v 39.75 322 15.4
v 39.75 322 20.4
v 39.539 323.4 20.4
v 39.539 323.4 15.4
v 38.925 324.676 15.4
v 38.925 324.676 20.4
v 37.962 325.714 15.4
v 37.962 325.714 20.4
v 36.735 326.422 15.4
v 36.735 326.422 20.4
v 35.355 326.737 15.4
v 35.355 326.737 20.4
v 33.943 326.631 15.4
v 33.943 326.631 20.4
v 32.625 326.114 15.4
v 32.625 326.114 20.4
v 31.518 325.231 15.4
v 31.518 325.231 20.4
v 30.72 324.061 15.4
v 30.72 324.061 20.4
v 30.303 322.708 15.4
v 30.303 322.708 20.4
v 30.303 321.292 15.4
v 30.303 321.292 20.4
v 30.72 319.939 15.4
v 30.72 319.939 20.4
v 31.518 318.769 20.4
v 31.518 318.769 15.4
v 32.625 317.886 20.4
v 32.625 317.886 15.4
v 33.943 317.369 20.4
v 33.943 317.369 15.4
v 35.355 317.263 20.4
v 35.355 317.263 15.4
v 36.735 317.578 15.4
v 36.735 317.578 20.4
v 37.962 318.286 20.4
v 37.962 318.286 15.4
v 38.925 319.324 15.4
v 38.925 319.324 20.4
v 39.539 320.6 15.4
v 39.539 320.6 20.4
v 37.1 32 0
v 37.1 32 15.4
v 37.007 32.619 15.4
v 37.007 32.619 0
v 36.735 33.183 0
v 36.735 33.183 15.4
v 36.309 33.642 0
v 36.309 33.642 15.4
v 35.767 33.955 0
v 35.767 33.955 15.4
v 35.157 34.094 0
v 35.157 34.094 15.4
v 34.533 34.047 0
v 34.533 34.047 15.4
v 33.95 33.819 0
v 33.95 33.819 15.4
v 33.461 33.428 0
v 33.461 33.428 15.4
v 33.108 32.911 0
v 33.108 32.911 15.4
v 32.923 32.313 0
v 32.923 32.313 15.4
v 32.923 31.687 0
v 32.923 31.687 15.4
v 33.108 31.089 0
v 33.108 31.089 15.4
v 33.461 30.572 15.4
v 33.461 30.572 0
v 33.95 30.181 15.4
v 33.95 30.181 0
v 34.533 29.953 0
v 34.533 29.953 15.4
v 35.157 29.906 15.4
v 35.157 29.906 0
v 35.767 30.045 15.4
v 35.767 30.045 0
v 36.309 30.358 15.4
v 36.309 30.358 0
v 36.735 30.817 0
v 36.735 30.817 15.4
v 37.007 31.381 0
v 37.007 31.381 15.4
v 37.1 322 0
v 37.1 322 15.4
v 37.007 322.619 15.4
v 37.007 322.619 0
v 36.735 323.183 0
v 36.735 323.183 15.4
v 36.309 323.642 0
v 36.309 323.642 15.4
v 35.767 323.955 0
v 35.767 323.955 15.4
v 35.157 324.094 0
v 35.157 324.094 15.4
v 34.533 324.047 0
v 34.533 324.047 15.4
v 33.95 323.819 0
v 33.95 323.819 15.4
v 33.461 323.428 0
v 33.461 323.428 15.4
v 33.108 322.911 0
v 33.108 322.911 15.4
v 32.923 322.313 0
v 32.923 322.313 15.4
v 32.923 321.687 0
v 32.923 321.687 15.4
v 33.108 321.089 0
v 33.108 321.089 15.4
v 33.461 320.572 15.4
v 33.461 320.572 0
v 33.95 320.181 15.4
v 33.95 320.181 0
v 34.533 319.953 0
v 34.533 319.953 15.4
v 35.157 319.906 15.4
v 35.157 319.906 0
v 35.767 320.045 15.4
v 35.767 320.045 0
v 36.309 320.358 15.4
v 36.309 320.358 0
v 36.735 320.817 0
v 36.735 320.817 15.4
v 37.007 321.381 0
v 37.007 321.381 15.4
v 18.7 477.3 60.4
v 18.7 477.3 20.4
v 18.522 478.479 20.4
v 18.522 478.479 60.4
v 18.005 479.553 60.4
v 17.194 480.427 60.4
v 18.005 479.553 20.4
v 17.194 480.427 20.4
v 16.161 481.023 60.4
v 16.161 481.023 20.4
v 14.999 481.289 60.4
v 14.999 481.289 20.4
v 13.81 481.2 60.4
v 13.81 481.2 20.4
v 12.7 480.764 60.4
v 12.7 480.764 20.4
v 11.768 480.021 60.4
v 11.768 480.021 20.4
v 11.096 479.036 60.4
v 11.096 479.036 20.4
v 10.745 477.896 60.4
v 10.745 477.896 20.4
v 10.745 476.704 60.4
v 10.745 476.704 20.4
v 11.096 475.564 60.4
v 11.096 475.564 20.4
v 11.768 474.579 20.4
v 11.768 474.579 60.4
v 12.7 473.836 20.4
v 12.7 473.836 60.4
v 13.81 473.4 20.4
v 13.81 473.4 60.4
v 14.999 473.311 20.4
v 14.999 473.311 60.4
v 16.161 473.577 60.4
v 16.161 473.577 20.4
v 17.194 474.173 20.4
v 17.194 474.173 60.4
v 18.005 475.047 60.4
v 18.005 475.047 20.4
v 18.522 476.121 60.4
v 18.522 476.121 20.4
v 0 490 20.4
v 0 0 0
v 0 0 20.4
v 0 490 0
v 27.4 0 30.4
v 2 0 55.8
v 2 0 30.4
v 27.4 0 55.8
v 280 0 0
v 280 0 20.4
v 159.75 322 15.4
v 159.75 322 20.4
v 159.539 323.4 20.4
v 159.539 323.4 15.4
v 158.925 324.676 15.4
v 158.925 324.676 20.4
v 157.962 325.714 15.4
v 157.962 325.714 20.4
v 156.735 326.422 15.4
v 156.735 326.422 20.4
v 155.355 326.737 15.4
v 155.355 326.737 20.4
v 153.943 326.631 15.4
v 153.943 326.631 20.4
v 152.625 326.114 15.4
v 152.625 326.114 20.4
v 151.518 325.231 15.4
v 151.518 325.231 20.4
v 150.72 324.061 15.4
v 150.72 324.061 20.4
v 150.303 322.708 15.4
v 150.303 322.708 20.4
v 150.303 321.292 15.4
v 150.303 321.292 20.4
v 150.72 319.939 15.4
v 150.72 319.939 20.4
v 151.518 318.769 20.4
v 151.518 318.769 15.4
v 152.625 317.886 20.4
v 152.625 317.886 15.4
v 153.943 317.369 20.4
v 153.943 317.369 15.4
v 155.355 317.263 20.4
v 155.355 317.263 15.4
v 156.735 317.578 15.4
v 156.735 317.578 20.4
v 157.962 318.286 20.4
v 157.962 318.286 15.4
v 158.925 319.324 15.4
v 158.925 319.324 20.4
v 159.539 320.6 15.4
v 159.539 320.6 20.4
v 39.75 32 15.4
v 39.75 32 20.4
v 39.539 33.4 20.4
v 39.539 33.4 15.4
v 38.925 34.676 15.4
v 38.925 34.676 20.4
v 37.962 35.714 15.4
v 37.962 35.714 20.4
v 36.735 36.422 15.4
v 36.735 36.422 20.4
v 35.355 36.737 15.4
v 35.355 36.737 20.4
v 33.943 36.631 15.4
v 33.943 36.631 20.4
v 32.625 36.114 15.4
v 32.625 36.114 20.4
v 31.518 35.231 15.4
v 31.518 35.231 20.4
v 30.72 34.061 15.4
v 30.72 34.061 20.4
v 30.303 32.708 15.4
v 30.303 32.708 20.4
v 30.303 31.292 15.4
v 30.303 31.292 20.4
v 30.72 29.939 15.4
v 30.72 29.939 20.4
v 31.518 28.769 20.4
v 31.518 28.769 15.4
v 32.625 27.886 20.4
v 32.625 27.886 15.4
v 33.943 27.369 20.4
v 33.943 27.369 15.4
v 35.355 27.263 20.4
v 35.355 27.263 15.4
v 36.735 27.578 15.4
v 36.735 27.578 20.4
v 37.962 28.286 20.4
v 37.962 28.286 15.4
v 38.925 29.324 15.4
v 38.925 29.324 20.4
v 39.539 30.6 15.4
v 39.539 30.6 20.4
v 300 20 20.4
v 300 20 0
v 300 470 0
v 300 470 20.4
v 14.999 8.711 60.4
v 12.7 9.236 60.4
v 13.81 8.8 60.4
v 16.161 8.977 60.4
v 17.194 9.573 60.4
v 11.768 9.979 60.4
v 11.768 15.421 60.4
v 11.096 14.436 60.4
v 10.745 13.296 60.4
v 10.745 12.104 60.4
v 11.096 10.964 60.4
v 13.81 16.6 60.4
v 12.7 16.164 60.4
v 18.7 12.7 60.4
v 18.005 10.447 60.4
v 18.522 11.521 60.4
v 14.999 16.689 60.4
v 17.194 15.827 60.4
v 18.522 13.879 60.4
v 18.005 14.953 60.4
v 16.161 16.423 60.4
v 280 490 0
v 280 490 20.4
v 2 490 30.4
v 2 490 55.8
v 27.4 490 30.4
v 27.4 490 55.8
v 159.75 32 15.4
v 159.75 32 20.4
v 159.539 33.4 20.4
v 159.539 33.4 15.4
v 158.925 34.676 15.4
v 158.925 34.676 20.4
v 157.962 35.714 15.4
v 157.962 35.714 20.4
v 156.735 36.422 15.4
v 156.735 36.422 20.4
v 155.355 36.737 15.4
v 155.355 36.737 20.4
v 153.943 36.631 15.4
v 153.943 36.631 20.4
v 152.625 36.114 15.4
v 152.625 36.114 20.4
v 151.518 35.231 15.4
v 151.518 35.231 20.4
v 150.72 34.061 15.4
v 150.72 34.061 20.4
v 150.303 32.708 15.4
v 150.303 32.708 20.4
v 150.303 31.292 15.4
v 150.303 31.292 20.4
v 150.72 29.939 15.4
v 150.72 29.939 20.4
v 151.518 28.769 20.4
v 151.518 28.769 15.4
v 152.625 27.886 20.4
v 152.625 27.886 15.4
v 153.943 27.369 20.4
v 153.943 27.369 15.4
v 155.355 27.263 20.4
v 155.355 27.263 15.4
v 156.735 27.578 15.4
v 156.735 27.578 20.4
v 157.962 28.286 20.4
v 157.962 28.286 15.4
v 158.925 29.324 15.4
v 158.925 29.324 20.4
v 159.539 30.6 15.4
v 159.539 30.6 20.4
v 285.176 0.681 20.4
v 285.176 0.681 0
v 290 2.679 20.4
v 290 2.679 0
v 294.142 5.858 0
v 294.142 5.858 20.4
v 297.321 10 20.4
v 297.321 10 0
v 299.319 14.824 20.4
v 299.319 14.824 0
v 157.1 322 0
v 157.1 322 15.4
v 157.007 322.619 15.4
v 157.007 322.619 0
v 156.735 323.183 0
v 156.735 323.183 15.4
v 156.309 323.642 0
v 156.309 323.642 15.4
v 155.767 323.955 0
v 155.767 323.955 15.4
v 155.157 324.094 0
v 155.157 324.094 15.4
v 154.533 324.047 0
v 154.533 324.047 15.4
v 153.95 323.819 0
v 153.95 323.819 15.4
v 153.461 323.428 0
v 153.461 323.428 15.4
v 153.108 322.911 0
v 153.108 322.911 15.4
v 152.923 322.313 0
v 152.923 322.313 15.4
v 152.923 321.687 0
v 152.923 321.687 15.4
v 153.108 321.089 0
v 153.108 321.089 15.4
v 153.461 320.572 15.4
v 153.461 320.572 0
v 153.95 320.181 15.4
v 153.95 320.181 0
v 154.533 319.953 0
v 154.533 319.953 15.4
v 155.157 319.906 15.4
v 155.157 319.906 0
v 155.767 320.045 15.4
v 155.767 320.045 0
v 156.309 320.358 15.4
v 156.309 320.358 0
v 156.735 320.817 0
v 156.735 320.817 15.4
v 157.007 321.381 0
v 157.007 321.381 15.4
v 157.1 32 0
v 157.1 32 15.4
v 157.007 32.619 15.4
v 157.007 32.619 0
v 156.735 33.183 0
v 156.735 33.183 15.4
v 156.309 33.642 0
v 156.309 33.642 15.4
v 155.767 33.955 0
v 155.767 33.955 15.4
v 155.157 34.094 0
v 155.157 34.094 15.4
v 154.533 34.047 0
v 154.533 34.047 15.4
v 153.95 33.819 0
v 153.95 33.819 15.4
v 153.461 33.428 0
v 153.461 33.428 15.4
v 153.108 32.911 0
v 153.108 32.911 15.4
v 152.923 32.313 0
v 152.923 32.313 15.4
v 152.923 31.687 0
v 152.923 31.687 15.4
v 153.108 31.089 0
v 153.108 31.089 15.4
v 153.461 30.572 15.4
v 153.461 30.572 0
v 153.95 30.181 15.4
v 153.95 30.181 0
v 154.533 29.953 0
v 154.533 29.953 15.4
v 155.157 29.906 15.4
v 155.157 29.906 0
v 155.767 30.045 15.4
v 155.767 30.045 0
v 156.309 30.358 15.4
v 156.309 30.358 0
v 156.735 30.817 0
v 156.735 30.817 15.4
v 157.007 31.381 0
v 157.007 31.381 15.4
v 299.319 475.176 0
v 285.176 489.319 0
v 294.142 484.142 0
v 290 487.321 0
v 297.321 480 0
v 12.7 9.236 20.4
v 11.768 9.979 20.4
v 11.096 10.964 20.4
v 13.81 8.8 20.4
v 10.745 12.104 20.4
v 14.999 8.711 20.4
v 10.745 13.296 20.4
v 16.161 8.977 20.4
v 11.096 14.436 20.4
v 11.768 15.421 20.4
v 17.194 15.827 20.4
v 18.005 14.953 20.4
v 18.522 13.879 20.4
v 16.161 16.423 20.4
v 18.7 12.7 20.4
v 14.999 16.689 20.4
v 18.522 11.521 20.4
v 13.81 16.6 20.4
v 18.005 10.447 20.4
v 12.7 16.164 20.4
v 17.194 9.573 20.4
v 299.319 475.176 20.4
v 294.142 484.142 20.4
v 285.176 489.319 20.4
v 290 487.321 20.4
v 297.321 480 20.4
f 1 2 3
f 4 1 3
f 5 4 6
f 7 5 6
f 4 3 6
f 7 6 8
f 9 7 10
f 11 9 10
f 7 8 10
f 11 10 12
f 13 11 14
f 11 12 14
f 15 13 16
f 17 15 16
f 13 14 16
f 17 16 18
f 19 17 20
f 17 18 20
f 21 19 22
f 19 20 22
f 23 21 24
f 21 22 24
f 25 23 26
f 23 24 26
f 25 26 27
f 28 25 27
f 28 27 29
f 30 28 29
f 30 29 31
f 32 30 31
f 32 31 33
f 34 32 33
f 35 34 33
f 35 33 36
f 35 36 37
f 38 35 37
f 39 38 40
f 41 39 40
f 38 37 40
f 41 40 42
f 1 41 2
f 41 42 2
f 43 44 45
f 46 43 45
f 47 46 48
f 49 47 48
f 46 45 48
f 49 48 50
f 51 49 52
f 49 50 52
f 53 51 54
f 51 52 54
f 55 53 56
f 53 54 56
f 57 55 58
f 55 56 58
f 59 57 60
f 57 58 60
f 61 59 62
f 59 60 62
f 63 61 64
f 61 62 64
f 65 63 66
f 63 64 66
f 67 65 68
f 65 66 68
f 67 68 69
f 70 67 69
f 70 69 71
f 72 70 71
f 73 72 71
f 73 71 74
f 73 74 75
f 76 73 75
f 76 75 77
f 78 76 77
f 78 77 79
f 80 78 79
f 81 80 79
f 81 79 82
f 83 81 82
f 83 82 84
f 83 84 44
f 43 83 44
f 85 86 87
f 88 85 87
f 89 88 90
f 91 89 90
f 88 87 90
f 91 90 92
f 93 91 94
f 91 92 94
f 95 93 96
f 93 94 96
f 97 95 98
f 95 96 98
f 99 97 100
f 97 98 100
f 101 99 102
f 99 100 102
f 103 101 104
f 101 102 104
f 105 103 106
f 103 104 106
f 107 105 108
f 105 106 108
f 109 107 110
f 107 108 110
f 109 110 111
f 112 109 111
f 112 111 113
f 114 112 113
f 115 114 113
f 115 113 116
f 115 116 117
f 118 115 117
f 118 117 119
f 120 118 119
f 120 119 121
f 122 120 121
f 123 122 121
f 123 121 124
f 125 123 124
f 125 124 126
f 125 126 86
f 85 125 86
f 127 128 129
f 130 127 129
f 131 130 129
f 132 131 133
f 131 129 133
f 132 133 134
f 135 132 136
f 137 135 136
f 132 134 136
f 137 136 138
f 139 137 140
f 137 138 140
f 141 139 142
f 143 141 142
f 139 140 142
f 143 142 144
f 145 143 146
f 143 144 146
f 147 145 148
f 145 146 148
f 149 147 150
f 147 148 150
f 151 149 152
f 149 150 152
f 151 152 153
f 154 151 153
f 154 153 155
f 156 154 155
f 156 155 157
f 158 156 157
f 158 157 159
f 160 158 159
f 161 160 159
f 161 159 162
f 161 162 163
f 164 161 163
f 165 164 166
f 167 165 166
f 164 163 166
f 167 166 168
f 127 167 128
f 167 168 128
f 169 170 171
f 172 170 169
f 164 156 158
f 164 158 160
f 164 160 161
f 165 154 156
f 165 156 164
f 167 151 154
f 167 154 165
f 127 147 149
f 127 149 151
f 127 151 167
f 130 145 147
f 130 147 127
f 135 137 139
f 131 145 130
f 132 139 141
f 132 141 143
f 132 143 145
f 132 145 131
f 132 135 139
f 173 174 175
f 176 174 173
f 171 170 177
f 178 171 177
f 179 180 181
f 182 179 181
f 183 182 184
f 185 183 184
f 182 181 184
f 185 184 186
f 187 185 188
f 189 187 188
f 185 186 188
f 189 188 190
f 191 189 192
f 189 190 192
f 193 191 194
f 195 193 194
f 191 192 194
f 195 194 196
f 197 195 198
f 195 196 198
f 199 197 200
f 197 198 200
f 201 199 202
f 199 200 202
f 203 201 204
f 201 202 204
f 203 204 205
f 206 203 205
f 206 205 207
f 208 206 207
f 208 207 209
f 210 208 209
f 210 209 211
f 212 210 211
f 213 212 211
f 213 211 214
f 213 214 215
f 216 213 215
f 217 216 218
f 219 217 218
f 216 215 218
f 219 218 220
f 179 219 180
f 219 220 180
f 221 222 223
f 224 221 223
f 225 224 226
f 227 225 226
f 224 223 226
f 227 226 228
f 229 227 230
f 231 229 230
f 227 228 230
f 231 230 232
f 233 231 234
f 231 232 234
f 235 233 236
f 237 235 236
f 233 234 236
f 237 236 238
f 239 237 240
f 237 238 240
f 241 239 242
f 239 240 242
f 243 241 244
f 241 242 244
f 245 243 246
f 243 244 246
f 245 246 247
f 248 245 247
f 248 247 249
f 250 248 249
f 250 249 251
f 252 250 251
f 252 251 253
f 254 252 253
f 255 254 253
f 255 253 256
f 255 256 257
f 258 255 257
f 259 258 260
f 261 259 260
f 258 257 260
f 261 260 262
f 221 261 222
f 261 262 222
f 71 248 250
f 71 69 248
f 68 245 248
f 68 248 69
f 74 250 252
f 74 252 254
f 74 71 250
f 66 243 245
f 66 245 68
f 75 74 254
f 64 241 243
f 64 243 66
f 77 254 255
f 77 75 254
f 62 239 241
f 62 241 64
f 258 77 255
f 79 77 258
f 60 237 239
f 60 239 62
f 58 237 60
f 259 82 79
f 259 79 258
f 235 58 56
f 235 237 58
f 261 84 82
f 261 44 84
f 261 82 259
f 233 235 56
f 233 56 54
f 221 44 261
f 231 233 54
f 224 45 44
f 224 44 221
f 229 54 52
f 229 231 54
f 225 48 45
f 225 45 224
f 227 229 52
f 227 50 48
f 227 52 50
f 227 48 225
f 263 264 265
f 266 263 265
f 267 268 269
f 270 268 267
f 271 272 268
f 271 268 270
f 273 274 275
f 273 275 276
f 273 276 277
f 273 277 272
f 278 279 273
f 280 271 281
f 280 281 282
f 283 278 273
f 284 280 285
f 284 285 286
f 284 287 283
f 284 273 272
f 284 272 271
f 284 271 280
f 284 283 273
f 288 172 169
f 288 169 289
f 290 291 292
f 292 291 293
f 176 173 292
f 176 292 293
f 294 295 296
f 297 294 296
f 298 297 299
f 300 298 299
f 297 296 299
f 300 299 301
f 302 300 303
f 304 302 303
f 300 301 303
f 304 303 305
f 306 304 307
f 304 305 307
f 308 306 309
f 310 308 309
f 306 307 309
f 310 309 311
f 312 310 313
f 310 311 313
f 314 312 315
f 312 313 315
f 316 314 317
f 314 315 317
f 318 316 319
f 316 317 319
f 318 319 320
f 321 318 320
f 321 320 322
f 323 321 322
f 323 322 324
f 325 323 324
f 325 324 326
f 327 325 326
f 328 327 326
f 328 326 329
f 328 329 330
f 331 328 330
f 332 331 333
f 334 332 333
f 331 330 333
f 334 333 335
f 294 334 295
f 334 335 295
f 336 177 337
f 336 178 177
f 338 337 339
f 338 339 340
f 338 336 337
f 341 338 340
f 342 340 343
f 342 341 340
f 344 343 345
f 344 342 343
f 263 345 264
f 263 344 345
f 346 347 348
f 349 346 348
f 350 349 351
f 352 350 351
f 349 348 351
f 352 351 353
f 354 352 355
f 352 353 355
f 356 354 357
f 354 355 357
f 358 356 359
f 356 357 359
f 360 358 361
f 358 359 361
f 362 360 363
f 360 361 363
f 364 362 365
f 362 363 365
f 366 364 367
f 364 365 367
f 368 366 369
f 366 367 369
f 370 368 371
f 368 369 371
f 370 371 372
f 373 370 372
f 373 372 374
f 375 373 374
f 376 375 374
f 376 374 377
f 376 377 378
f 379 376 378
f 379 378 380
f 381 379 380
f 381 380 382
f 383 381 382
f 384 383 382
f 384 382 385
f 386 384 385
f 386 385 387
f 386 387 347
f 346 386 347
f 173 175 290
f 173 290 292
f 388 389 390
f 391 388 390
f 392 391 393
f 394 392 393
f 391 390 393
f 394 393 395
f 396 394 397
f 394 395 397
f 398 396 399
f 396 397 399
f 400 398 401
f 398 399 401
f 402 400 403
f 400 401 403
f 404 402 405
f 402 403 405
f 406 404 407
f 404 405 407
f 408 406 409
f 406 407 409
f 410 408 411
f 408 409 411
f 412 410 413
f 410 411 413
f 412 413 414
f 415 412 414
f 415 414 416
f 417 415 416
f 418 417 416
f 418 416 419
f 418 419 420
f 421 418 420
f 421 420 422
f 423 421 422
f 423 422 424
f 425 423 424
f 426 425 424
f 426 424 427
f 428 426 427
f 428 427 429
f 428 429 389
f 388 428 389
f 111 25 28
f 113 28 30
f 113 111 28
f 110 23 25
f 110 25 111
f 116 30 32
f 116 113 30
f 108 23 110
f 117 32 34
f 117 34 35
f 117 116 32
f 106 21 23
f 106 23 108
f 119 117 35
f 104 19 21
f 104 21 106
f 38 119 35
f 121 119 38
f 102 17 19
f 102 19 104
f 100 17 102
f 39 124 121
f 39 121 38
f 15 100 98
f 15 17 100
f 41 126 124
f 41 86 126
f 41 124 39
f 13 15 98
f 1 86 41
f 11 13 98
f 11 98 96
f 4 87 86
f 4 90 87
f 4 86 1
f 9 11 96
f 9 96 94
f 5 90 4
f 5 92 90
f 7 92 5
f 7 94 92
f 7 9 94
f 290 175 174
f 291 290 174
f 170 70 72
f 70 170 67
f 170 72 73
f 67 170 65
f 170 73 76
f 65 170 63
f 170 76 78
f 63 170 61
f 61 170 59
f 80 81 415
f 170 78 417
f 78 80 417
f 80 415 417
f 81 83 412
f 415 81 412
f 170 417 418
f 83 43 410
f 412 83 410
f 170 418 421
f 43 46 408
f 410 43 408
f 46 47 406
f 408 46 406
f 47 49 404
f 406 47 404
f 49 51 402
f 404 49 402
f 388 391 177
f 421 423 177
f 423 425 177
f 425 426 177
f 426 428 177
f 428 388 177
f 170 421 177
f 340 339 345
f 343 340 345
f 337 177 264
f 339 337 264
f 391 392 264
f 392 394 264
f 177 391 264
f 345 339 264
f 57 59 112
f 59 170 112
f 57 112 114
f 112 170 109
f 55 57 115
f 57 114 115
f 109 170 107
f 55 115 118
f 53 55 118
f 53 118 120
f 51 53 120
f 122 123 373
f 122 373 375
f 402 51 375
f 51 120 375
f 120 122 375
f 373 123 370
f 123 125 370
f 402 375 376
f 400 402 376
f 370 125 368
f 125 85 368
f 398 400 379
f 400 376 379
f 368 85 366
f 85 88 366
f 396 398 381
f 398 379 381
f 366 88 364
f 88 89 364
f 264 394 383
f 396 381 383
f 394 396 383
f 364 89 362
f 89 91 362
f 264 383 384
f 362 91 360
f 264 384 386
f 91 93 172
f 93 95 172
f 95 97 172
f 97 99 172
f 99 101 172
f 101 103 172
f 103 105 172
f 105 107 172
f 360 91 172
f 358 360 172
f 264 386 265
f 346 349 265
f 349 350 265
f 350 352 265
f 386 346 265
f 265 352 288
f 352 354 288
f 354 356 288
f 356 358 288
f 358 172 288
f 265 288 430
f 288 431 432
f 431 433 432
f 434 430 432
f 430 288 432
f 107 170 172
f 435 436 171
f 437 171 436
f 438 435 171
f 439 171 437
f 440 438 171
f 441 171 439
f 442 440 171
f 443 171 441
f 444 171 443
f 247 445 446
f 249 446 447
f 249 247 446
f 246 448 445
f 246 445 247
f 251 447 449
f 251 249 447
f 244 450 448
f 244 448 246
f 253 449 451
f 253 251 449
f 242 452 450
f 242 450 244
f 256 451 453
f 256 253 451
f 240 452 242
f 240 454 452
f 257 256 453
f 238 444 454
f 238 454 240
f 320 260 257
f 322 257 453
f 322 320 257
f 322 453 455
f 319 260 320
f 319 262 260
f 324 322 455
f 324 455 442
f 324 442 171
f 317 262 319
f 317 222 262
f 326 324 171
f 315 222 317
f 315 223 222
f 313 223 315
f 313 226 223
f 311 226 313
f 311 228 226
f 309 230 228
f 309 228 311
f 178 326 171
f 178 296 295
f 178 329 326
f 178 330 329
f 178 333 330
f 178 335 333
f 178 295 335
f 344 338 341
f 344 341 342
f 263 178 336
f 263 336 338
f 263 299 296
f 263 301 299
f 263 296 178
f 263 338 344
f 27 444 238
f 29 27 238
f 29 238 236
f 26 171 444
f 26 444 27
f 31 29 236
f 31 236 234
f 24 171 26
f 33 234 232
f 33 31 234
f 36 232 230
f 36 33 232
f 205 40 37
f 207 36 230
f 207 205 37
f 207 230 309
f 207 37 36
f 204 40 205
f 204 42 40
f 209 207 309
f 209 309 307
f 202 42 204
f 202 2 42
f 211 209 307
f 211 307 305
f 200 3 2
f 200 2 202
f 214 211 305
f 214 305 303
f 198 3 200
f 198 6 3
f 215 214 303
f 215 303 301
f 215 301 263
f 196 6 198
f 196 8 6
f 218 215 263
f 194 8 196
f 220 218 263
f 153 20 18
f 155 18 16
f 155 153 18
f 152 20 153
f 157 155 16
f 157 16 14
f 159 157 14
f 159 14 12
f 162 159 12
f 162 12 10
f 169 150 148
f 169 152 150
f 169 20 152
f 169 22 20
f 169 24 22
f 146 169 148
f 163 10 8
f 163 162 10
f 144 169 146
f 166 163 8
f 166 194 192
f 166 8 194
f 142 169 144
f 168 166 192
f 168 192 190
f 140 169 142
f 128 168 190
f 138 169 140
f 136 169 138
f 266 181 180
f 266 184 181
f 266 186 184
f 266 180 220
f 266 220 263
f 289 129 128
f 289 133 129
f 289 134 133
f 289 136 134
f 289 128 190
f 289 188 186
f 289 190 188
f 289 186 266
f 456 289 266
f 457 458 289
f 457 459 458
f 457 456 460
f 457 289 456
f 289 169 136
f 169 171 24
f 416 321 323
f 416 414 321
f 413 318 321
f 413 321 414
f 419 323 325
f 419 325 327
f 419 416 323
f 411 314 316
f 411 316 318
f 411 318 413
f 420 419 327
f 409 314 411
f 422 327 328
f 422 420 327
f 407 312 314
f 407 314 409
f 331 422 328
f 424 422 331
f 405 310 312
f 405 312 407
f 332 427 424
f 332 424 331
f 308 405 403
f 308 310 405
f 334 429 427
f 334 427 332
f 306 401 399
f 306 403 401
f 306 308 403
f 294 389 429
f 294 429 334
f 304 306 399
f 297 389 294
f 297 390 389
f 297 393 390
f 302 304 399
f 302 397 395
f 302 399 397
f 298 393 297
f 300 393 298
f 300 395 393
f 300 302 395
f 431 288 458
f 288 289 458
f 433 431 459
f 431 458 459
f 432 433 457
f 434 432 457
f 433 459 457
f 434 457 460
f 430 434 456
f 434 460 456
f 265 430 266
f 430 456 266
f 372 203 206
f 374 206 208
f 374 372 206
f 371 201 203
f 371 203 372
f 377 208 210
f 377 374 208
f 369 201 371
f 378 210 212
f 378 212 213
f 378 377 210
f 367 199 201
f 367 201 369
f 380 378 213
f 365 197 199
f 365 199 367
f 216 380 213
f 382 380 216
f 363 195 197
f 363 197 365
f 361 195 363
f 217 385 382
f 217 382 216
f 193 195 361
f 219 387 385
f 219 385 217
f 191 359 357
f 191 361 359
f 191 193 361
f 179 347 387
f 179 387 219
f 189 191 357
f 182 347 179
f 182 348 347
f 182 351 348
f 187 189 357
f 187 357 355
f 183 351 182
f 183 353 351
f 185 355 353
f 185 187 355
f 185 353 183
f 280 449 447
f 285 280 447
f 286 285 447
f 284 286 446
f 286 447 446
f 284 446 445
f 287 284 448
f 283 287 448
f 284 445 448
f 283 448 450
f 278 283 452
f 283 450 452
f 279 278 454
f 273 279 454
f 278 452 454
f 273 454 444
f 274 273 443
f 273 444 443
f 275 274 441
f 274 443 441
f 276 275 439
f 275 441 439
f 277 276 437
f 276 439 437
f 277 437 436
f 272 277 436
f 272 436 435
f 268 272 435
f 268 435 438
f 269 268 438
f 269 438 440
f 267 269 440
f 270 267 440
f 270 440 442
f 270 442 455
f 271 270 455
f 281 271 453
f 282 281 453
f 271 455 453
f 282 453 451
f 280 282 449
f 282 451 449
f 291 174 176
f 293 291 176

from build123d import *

# Parameters (mm, degrees)
F0_W     = 300
F0_H     = 490
F1_DEPTH = 20.4
F2_R     = 4.75
F2_R_2   = 2.1
F3_DEPTH = 5
F4_DEPTH = 25
F5_R     = 20
F6_R     = 4
F7_DEPTH = 40
F8_W     = 25.4
F8_H     = 25.4
F9_DEPTH = 490


with BuildPart() as f1:
    # F0 (on Top) → F1 (new body)
    with BuildSketch(Plane.XY):
        with Locations((150, 245)):
            Rectangle(F0_W, F0_H)
    extrude(amount=F1_DEPTH)

    # F2 (on face) → F3 (cut)
    with BuildSketch(Plane.XY.offset(20.4)):
        with Locations((35, 32)):
            Circle(F2_R)
        with Locations((35, 32)):
            Circle(F2_R_2, mode=Mode.SUBTRACT)
        with Locations((155, 32)):
            Circle(F2_R)
        with Locations((155, 32)):
            Circle(F2_R_2, mode=Mode.SUBTRACT)
        with Locations((35, 322)):
            Circle(F2_R)
        with Locations((35, 322)):
            Circle(F2_R_2, mode=Mode.SUBTRACT)
        with Locations((155, 322)):
            Circle(F2_R)
        with Locations((155, 322)):
            Circle(F2_R_2, mode=Mode.SUBTRACT)
    extrude(amount=-F3_DEPTH, mode=Mode.SUBTRACT)

    # F4 (cut): faces of the model
    f4_faces = [f1.faces().sort_by_distance(p)[0] for p in [
        (35, 32, 20.4),
        (155, 32, 20.4),
        (35, 322, 20.4),
        (155, 322, 20.4),
    ]]
    extrude(f4_faces, amount=-F4_DEPTH, mode=Mode.SUBTRACT)

    # F5
    f5_edges = [f1.edges().sort_by_distance(p)[0] for p in [
        (300, 0, 10.2),
        (300, 490, 10.2),
    ]]
    fillet(f5_edges, radius=F5_R)

    # F6 (on face) → F7 (join)
    with BuildSketch(Plane.XY.offset(20.4)):
        with Locations((14.7, 12.7)):
            Circle(F6_R)
        with Locations((14.7, 477.3)):
            Circle(F6_R)
    extrude(amount=F7_DEPTH)


with BuildPart() as f9:
    # F8 (on face) → F9 (new body, through all)
    with BuildSketch(Plane.XZ):
        with Locations((14.7, 43.1)):
            Rectangle(F8_W, F8_H)
    extrude(amount=-F9_DEPTH)


solid = Compound([f1.part, f9.part])
